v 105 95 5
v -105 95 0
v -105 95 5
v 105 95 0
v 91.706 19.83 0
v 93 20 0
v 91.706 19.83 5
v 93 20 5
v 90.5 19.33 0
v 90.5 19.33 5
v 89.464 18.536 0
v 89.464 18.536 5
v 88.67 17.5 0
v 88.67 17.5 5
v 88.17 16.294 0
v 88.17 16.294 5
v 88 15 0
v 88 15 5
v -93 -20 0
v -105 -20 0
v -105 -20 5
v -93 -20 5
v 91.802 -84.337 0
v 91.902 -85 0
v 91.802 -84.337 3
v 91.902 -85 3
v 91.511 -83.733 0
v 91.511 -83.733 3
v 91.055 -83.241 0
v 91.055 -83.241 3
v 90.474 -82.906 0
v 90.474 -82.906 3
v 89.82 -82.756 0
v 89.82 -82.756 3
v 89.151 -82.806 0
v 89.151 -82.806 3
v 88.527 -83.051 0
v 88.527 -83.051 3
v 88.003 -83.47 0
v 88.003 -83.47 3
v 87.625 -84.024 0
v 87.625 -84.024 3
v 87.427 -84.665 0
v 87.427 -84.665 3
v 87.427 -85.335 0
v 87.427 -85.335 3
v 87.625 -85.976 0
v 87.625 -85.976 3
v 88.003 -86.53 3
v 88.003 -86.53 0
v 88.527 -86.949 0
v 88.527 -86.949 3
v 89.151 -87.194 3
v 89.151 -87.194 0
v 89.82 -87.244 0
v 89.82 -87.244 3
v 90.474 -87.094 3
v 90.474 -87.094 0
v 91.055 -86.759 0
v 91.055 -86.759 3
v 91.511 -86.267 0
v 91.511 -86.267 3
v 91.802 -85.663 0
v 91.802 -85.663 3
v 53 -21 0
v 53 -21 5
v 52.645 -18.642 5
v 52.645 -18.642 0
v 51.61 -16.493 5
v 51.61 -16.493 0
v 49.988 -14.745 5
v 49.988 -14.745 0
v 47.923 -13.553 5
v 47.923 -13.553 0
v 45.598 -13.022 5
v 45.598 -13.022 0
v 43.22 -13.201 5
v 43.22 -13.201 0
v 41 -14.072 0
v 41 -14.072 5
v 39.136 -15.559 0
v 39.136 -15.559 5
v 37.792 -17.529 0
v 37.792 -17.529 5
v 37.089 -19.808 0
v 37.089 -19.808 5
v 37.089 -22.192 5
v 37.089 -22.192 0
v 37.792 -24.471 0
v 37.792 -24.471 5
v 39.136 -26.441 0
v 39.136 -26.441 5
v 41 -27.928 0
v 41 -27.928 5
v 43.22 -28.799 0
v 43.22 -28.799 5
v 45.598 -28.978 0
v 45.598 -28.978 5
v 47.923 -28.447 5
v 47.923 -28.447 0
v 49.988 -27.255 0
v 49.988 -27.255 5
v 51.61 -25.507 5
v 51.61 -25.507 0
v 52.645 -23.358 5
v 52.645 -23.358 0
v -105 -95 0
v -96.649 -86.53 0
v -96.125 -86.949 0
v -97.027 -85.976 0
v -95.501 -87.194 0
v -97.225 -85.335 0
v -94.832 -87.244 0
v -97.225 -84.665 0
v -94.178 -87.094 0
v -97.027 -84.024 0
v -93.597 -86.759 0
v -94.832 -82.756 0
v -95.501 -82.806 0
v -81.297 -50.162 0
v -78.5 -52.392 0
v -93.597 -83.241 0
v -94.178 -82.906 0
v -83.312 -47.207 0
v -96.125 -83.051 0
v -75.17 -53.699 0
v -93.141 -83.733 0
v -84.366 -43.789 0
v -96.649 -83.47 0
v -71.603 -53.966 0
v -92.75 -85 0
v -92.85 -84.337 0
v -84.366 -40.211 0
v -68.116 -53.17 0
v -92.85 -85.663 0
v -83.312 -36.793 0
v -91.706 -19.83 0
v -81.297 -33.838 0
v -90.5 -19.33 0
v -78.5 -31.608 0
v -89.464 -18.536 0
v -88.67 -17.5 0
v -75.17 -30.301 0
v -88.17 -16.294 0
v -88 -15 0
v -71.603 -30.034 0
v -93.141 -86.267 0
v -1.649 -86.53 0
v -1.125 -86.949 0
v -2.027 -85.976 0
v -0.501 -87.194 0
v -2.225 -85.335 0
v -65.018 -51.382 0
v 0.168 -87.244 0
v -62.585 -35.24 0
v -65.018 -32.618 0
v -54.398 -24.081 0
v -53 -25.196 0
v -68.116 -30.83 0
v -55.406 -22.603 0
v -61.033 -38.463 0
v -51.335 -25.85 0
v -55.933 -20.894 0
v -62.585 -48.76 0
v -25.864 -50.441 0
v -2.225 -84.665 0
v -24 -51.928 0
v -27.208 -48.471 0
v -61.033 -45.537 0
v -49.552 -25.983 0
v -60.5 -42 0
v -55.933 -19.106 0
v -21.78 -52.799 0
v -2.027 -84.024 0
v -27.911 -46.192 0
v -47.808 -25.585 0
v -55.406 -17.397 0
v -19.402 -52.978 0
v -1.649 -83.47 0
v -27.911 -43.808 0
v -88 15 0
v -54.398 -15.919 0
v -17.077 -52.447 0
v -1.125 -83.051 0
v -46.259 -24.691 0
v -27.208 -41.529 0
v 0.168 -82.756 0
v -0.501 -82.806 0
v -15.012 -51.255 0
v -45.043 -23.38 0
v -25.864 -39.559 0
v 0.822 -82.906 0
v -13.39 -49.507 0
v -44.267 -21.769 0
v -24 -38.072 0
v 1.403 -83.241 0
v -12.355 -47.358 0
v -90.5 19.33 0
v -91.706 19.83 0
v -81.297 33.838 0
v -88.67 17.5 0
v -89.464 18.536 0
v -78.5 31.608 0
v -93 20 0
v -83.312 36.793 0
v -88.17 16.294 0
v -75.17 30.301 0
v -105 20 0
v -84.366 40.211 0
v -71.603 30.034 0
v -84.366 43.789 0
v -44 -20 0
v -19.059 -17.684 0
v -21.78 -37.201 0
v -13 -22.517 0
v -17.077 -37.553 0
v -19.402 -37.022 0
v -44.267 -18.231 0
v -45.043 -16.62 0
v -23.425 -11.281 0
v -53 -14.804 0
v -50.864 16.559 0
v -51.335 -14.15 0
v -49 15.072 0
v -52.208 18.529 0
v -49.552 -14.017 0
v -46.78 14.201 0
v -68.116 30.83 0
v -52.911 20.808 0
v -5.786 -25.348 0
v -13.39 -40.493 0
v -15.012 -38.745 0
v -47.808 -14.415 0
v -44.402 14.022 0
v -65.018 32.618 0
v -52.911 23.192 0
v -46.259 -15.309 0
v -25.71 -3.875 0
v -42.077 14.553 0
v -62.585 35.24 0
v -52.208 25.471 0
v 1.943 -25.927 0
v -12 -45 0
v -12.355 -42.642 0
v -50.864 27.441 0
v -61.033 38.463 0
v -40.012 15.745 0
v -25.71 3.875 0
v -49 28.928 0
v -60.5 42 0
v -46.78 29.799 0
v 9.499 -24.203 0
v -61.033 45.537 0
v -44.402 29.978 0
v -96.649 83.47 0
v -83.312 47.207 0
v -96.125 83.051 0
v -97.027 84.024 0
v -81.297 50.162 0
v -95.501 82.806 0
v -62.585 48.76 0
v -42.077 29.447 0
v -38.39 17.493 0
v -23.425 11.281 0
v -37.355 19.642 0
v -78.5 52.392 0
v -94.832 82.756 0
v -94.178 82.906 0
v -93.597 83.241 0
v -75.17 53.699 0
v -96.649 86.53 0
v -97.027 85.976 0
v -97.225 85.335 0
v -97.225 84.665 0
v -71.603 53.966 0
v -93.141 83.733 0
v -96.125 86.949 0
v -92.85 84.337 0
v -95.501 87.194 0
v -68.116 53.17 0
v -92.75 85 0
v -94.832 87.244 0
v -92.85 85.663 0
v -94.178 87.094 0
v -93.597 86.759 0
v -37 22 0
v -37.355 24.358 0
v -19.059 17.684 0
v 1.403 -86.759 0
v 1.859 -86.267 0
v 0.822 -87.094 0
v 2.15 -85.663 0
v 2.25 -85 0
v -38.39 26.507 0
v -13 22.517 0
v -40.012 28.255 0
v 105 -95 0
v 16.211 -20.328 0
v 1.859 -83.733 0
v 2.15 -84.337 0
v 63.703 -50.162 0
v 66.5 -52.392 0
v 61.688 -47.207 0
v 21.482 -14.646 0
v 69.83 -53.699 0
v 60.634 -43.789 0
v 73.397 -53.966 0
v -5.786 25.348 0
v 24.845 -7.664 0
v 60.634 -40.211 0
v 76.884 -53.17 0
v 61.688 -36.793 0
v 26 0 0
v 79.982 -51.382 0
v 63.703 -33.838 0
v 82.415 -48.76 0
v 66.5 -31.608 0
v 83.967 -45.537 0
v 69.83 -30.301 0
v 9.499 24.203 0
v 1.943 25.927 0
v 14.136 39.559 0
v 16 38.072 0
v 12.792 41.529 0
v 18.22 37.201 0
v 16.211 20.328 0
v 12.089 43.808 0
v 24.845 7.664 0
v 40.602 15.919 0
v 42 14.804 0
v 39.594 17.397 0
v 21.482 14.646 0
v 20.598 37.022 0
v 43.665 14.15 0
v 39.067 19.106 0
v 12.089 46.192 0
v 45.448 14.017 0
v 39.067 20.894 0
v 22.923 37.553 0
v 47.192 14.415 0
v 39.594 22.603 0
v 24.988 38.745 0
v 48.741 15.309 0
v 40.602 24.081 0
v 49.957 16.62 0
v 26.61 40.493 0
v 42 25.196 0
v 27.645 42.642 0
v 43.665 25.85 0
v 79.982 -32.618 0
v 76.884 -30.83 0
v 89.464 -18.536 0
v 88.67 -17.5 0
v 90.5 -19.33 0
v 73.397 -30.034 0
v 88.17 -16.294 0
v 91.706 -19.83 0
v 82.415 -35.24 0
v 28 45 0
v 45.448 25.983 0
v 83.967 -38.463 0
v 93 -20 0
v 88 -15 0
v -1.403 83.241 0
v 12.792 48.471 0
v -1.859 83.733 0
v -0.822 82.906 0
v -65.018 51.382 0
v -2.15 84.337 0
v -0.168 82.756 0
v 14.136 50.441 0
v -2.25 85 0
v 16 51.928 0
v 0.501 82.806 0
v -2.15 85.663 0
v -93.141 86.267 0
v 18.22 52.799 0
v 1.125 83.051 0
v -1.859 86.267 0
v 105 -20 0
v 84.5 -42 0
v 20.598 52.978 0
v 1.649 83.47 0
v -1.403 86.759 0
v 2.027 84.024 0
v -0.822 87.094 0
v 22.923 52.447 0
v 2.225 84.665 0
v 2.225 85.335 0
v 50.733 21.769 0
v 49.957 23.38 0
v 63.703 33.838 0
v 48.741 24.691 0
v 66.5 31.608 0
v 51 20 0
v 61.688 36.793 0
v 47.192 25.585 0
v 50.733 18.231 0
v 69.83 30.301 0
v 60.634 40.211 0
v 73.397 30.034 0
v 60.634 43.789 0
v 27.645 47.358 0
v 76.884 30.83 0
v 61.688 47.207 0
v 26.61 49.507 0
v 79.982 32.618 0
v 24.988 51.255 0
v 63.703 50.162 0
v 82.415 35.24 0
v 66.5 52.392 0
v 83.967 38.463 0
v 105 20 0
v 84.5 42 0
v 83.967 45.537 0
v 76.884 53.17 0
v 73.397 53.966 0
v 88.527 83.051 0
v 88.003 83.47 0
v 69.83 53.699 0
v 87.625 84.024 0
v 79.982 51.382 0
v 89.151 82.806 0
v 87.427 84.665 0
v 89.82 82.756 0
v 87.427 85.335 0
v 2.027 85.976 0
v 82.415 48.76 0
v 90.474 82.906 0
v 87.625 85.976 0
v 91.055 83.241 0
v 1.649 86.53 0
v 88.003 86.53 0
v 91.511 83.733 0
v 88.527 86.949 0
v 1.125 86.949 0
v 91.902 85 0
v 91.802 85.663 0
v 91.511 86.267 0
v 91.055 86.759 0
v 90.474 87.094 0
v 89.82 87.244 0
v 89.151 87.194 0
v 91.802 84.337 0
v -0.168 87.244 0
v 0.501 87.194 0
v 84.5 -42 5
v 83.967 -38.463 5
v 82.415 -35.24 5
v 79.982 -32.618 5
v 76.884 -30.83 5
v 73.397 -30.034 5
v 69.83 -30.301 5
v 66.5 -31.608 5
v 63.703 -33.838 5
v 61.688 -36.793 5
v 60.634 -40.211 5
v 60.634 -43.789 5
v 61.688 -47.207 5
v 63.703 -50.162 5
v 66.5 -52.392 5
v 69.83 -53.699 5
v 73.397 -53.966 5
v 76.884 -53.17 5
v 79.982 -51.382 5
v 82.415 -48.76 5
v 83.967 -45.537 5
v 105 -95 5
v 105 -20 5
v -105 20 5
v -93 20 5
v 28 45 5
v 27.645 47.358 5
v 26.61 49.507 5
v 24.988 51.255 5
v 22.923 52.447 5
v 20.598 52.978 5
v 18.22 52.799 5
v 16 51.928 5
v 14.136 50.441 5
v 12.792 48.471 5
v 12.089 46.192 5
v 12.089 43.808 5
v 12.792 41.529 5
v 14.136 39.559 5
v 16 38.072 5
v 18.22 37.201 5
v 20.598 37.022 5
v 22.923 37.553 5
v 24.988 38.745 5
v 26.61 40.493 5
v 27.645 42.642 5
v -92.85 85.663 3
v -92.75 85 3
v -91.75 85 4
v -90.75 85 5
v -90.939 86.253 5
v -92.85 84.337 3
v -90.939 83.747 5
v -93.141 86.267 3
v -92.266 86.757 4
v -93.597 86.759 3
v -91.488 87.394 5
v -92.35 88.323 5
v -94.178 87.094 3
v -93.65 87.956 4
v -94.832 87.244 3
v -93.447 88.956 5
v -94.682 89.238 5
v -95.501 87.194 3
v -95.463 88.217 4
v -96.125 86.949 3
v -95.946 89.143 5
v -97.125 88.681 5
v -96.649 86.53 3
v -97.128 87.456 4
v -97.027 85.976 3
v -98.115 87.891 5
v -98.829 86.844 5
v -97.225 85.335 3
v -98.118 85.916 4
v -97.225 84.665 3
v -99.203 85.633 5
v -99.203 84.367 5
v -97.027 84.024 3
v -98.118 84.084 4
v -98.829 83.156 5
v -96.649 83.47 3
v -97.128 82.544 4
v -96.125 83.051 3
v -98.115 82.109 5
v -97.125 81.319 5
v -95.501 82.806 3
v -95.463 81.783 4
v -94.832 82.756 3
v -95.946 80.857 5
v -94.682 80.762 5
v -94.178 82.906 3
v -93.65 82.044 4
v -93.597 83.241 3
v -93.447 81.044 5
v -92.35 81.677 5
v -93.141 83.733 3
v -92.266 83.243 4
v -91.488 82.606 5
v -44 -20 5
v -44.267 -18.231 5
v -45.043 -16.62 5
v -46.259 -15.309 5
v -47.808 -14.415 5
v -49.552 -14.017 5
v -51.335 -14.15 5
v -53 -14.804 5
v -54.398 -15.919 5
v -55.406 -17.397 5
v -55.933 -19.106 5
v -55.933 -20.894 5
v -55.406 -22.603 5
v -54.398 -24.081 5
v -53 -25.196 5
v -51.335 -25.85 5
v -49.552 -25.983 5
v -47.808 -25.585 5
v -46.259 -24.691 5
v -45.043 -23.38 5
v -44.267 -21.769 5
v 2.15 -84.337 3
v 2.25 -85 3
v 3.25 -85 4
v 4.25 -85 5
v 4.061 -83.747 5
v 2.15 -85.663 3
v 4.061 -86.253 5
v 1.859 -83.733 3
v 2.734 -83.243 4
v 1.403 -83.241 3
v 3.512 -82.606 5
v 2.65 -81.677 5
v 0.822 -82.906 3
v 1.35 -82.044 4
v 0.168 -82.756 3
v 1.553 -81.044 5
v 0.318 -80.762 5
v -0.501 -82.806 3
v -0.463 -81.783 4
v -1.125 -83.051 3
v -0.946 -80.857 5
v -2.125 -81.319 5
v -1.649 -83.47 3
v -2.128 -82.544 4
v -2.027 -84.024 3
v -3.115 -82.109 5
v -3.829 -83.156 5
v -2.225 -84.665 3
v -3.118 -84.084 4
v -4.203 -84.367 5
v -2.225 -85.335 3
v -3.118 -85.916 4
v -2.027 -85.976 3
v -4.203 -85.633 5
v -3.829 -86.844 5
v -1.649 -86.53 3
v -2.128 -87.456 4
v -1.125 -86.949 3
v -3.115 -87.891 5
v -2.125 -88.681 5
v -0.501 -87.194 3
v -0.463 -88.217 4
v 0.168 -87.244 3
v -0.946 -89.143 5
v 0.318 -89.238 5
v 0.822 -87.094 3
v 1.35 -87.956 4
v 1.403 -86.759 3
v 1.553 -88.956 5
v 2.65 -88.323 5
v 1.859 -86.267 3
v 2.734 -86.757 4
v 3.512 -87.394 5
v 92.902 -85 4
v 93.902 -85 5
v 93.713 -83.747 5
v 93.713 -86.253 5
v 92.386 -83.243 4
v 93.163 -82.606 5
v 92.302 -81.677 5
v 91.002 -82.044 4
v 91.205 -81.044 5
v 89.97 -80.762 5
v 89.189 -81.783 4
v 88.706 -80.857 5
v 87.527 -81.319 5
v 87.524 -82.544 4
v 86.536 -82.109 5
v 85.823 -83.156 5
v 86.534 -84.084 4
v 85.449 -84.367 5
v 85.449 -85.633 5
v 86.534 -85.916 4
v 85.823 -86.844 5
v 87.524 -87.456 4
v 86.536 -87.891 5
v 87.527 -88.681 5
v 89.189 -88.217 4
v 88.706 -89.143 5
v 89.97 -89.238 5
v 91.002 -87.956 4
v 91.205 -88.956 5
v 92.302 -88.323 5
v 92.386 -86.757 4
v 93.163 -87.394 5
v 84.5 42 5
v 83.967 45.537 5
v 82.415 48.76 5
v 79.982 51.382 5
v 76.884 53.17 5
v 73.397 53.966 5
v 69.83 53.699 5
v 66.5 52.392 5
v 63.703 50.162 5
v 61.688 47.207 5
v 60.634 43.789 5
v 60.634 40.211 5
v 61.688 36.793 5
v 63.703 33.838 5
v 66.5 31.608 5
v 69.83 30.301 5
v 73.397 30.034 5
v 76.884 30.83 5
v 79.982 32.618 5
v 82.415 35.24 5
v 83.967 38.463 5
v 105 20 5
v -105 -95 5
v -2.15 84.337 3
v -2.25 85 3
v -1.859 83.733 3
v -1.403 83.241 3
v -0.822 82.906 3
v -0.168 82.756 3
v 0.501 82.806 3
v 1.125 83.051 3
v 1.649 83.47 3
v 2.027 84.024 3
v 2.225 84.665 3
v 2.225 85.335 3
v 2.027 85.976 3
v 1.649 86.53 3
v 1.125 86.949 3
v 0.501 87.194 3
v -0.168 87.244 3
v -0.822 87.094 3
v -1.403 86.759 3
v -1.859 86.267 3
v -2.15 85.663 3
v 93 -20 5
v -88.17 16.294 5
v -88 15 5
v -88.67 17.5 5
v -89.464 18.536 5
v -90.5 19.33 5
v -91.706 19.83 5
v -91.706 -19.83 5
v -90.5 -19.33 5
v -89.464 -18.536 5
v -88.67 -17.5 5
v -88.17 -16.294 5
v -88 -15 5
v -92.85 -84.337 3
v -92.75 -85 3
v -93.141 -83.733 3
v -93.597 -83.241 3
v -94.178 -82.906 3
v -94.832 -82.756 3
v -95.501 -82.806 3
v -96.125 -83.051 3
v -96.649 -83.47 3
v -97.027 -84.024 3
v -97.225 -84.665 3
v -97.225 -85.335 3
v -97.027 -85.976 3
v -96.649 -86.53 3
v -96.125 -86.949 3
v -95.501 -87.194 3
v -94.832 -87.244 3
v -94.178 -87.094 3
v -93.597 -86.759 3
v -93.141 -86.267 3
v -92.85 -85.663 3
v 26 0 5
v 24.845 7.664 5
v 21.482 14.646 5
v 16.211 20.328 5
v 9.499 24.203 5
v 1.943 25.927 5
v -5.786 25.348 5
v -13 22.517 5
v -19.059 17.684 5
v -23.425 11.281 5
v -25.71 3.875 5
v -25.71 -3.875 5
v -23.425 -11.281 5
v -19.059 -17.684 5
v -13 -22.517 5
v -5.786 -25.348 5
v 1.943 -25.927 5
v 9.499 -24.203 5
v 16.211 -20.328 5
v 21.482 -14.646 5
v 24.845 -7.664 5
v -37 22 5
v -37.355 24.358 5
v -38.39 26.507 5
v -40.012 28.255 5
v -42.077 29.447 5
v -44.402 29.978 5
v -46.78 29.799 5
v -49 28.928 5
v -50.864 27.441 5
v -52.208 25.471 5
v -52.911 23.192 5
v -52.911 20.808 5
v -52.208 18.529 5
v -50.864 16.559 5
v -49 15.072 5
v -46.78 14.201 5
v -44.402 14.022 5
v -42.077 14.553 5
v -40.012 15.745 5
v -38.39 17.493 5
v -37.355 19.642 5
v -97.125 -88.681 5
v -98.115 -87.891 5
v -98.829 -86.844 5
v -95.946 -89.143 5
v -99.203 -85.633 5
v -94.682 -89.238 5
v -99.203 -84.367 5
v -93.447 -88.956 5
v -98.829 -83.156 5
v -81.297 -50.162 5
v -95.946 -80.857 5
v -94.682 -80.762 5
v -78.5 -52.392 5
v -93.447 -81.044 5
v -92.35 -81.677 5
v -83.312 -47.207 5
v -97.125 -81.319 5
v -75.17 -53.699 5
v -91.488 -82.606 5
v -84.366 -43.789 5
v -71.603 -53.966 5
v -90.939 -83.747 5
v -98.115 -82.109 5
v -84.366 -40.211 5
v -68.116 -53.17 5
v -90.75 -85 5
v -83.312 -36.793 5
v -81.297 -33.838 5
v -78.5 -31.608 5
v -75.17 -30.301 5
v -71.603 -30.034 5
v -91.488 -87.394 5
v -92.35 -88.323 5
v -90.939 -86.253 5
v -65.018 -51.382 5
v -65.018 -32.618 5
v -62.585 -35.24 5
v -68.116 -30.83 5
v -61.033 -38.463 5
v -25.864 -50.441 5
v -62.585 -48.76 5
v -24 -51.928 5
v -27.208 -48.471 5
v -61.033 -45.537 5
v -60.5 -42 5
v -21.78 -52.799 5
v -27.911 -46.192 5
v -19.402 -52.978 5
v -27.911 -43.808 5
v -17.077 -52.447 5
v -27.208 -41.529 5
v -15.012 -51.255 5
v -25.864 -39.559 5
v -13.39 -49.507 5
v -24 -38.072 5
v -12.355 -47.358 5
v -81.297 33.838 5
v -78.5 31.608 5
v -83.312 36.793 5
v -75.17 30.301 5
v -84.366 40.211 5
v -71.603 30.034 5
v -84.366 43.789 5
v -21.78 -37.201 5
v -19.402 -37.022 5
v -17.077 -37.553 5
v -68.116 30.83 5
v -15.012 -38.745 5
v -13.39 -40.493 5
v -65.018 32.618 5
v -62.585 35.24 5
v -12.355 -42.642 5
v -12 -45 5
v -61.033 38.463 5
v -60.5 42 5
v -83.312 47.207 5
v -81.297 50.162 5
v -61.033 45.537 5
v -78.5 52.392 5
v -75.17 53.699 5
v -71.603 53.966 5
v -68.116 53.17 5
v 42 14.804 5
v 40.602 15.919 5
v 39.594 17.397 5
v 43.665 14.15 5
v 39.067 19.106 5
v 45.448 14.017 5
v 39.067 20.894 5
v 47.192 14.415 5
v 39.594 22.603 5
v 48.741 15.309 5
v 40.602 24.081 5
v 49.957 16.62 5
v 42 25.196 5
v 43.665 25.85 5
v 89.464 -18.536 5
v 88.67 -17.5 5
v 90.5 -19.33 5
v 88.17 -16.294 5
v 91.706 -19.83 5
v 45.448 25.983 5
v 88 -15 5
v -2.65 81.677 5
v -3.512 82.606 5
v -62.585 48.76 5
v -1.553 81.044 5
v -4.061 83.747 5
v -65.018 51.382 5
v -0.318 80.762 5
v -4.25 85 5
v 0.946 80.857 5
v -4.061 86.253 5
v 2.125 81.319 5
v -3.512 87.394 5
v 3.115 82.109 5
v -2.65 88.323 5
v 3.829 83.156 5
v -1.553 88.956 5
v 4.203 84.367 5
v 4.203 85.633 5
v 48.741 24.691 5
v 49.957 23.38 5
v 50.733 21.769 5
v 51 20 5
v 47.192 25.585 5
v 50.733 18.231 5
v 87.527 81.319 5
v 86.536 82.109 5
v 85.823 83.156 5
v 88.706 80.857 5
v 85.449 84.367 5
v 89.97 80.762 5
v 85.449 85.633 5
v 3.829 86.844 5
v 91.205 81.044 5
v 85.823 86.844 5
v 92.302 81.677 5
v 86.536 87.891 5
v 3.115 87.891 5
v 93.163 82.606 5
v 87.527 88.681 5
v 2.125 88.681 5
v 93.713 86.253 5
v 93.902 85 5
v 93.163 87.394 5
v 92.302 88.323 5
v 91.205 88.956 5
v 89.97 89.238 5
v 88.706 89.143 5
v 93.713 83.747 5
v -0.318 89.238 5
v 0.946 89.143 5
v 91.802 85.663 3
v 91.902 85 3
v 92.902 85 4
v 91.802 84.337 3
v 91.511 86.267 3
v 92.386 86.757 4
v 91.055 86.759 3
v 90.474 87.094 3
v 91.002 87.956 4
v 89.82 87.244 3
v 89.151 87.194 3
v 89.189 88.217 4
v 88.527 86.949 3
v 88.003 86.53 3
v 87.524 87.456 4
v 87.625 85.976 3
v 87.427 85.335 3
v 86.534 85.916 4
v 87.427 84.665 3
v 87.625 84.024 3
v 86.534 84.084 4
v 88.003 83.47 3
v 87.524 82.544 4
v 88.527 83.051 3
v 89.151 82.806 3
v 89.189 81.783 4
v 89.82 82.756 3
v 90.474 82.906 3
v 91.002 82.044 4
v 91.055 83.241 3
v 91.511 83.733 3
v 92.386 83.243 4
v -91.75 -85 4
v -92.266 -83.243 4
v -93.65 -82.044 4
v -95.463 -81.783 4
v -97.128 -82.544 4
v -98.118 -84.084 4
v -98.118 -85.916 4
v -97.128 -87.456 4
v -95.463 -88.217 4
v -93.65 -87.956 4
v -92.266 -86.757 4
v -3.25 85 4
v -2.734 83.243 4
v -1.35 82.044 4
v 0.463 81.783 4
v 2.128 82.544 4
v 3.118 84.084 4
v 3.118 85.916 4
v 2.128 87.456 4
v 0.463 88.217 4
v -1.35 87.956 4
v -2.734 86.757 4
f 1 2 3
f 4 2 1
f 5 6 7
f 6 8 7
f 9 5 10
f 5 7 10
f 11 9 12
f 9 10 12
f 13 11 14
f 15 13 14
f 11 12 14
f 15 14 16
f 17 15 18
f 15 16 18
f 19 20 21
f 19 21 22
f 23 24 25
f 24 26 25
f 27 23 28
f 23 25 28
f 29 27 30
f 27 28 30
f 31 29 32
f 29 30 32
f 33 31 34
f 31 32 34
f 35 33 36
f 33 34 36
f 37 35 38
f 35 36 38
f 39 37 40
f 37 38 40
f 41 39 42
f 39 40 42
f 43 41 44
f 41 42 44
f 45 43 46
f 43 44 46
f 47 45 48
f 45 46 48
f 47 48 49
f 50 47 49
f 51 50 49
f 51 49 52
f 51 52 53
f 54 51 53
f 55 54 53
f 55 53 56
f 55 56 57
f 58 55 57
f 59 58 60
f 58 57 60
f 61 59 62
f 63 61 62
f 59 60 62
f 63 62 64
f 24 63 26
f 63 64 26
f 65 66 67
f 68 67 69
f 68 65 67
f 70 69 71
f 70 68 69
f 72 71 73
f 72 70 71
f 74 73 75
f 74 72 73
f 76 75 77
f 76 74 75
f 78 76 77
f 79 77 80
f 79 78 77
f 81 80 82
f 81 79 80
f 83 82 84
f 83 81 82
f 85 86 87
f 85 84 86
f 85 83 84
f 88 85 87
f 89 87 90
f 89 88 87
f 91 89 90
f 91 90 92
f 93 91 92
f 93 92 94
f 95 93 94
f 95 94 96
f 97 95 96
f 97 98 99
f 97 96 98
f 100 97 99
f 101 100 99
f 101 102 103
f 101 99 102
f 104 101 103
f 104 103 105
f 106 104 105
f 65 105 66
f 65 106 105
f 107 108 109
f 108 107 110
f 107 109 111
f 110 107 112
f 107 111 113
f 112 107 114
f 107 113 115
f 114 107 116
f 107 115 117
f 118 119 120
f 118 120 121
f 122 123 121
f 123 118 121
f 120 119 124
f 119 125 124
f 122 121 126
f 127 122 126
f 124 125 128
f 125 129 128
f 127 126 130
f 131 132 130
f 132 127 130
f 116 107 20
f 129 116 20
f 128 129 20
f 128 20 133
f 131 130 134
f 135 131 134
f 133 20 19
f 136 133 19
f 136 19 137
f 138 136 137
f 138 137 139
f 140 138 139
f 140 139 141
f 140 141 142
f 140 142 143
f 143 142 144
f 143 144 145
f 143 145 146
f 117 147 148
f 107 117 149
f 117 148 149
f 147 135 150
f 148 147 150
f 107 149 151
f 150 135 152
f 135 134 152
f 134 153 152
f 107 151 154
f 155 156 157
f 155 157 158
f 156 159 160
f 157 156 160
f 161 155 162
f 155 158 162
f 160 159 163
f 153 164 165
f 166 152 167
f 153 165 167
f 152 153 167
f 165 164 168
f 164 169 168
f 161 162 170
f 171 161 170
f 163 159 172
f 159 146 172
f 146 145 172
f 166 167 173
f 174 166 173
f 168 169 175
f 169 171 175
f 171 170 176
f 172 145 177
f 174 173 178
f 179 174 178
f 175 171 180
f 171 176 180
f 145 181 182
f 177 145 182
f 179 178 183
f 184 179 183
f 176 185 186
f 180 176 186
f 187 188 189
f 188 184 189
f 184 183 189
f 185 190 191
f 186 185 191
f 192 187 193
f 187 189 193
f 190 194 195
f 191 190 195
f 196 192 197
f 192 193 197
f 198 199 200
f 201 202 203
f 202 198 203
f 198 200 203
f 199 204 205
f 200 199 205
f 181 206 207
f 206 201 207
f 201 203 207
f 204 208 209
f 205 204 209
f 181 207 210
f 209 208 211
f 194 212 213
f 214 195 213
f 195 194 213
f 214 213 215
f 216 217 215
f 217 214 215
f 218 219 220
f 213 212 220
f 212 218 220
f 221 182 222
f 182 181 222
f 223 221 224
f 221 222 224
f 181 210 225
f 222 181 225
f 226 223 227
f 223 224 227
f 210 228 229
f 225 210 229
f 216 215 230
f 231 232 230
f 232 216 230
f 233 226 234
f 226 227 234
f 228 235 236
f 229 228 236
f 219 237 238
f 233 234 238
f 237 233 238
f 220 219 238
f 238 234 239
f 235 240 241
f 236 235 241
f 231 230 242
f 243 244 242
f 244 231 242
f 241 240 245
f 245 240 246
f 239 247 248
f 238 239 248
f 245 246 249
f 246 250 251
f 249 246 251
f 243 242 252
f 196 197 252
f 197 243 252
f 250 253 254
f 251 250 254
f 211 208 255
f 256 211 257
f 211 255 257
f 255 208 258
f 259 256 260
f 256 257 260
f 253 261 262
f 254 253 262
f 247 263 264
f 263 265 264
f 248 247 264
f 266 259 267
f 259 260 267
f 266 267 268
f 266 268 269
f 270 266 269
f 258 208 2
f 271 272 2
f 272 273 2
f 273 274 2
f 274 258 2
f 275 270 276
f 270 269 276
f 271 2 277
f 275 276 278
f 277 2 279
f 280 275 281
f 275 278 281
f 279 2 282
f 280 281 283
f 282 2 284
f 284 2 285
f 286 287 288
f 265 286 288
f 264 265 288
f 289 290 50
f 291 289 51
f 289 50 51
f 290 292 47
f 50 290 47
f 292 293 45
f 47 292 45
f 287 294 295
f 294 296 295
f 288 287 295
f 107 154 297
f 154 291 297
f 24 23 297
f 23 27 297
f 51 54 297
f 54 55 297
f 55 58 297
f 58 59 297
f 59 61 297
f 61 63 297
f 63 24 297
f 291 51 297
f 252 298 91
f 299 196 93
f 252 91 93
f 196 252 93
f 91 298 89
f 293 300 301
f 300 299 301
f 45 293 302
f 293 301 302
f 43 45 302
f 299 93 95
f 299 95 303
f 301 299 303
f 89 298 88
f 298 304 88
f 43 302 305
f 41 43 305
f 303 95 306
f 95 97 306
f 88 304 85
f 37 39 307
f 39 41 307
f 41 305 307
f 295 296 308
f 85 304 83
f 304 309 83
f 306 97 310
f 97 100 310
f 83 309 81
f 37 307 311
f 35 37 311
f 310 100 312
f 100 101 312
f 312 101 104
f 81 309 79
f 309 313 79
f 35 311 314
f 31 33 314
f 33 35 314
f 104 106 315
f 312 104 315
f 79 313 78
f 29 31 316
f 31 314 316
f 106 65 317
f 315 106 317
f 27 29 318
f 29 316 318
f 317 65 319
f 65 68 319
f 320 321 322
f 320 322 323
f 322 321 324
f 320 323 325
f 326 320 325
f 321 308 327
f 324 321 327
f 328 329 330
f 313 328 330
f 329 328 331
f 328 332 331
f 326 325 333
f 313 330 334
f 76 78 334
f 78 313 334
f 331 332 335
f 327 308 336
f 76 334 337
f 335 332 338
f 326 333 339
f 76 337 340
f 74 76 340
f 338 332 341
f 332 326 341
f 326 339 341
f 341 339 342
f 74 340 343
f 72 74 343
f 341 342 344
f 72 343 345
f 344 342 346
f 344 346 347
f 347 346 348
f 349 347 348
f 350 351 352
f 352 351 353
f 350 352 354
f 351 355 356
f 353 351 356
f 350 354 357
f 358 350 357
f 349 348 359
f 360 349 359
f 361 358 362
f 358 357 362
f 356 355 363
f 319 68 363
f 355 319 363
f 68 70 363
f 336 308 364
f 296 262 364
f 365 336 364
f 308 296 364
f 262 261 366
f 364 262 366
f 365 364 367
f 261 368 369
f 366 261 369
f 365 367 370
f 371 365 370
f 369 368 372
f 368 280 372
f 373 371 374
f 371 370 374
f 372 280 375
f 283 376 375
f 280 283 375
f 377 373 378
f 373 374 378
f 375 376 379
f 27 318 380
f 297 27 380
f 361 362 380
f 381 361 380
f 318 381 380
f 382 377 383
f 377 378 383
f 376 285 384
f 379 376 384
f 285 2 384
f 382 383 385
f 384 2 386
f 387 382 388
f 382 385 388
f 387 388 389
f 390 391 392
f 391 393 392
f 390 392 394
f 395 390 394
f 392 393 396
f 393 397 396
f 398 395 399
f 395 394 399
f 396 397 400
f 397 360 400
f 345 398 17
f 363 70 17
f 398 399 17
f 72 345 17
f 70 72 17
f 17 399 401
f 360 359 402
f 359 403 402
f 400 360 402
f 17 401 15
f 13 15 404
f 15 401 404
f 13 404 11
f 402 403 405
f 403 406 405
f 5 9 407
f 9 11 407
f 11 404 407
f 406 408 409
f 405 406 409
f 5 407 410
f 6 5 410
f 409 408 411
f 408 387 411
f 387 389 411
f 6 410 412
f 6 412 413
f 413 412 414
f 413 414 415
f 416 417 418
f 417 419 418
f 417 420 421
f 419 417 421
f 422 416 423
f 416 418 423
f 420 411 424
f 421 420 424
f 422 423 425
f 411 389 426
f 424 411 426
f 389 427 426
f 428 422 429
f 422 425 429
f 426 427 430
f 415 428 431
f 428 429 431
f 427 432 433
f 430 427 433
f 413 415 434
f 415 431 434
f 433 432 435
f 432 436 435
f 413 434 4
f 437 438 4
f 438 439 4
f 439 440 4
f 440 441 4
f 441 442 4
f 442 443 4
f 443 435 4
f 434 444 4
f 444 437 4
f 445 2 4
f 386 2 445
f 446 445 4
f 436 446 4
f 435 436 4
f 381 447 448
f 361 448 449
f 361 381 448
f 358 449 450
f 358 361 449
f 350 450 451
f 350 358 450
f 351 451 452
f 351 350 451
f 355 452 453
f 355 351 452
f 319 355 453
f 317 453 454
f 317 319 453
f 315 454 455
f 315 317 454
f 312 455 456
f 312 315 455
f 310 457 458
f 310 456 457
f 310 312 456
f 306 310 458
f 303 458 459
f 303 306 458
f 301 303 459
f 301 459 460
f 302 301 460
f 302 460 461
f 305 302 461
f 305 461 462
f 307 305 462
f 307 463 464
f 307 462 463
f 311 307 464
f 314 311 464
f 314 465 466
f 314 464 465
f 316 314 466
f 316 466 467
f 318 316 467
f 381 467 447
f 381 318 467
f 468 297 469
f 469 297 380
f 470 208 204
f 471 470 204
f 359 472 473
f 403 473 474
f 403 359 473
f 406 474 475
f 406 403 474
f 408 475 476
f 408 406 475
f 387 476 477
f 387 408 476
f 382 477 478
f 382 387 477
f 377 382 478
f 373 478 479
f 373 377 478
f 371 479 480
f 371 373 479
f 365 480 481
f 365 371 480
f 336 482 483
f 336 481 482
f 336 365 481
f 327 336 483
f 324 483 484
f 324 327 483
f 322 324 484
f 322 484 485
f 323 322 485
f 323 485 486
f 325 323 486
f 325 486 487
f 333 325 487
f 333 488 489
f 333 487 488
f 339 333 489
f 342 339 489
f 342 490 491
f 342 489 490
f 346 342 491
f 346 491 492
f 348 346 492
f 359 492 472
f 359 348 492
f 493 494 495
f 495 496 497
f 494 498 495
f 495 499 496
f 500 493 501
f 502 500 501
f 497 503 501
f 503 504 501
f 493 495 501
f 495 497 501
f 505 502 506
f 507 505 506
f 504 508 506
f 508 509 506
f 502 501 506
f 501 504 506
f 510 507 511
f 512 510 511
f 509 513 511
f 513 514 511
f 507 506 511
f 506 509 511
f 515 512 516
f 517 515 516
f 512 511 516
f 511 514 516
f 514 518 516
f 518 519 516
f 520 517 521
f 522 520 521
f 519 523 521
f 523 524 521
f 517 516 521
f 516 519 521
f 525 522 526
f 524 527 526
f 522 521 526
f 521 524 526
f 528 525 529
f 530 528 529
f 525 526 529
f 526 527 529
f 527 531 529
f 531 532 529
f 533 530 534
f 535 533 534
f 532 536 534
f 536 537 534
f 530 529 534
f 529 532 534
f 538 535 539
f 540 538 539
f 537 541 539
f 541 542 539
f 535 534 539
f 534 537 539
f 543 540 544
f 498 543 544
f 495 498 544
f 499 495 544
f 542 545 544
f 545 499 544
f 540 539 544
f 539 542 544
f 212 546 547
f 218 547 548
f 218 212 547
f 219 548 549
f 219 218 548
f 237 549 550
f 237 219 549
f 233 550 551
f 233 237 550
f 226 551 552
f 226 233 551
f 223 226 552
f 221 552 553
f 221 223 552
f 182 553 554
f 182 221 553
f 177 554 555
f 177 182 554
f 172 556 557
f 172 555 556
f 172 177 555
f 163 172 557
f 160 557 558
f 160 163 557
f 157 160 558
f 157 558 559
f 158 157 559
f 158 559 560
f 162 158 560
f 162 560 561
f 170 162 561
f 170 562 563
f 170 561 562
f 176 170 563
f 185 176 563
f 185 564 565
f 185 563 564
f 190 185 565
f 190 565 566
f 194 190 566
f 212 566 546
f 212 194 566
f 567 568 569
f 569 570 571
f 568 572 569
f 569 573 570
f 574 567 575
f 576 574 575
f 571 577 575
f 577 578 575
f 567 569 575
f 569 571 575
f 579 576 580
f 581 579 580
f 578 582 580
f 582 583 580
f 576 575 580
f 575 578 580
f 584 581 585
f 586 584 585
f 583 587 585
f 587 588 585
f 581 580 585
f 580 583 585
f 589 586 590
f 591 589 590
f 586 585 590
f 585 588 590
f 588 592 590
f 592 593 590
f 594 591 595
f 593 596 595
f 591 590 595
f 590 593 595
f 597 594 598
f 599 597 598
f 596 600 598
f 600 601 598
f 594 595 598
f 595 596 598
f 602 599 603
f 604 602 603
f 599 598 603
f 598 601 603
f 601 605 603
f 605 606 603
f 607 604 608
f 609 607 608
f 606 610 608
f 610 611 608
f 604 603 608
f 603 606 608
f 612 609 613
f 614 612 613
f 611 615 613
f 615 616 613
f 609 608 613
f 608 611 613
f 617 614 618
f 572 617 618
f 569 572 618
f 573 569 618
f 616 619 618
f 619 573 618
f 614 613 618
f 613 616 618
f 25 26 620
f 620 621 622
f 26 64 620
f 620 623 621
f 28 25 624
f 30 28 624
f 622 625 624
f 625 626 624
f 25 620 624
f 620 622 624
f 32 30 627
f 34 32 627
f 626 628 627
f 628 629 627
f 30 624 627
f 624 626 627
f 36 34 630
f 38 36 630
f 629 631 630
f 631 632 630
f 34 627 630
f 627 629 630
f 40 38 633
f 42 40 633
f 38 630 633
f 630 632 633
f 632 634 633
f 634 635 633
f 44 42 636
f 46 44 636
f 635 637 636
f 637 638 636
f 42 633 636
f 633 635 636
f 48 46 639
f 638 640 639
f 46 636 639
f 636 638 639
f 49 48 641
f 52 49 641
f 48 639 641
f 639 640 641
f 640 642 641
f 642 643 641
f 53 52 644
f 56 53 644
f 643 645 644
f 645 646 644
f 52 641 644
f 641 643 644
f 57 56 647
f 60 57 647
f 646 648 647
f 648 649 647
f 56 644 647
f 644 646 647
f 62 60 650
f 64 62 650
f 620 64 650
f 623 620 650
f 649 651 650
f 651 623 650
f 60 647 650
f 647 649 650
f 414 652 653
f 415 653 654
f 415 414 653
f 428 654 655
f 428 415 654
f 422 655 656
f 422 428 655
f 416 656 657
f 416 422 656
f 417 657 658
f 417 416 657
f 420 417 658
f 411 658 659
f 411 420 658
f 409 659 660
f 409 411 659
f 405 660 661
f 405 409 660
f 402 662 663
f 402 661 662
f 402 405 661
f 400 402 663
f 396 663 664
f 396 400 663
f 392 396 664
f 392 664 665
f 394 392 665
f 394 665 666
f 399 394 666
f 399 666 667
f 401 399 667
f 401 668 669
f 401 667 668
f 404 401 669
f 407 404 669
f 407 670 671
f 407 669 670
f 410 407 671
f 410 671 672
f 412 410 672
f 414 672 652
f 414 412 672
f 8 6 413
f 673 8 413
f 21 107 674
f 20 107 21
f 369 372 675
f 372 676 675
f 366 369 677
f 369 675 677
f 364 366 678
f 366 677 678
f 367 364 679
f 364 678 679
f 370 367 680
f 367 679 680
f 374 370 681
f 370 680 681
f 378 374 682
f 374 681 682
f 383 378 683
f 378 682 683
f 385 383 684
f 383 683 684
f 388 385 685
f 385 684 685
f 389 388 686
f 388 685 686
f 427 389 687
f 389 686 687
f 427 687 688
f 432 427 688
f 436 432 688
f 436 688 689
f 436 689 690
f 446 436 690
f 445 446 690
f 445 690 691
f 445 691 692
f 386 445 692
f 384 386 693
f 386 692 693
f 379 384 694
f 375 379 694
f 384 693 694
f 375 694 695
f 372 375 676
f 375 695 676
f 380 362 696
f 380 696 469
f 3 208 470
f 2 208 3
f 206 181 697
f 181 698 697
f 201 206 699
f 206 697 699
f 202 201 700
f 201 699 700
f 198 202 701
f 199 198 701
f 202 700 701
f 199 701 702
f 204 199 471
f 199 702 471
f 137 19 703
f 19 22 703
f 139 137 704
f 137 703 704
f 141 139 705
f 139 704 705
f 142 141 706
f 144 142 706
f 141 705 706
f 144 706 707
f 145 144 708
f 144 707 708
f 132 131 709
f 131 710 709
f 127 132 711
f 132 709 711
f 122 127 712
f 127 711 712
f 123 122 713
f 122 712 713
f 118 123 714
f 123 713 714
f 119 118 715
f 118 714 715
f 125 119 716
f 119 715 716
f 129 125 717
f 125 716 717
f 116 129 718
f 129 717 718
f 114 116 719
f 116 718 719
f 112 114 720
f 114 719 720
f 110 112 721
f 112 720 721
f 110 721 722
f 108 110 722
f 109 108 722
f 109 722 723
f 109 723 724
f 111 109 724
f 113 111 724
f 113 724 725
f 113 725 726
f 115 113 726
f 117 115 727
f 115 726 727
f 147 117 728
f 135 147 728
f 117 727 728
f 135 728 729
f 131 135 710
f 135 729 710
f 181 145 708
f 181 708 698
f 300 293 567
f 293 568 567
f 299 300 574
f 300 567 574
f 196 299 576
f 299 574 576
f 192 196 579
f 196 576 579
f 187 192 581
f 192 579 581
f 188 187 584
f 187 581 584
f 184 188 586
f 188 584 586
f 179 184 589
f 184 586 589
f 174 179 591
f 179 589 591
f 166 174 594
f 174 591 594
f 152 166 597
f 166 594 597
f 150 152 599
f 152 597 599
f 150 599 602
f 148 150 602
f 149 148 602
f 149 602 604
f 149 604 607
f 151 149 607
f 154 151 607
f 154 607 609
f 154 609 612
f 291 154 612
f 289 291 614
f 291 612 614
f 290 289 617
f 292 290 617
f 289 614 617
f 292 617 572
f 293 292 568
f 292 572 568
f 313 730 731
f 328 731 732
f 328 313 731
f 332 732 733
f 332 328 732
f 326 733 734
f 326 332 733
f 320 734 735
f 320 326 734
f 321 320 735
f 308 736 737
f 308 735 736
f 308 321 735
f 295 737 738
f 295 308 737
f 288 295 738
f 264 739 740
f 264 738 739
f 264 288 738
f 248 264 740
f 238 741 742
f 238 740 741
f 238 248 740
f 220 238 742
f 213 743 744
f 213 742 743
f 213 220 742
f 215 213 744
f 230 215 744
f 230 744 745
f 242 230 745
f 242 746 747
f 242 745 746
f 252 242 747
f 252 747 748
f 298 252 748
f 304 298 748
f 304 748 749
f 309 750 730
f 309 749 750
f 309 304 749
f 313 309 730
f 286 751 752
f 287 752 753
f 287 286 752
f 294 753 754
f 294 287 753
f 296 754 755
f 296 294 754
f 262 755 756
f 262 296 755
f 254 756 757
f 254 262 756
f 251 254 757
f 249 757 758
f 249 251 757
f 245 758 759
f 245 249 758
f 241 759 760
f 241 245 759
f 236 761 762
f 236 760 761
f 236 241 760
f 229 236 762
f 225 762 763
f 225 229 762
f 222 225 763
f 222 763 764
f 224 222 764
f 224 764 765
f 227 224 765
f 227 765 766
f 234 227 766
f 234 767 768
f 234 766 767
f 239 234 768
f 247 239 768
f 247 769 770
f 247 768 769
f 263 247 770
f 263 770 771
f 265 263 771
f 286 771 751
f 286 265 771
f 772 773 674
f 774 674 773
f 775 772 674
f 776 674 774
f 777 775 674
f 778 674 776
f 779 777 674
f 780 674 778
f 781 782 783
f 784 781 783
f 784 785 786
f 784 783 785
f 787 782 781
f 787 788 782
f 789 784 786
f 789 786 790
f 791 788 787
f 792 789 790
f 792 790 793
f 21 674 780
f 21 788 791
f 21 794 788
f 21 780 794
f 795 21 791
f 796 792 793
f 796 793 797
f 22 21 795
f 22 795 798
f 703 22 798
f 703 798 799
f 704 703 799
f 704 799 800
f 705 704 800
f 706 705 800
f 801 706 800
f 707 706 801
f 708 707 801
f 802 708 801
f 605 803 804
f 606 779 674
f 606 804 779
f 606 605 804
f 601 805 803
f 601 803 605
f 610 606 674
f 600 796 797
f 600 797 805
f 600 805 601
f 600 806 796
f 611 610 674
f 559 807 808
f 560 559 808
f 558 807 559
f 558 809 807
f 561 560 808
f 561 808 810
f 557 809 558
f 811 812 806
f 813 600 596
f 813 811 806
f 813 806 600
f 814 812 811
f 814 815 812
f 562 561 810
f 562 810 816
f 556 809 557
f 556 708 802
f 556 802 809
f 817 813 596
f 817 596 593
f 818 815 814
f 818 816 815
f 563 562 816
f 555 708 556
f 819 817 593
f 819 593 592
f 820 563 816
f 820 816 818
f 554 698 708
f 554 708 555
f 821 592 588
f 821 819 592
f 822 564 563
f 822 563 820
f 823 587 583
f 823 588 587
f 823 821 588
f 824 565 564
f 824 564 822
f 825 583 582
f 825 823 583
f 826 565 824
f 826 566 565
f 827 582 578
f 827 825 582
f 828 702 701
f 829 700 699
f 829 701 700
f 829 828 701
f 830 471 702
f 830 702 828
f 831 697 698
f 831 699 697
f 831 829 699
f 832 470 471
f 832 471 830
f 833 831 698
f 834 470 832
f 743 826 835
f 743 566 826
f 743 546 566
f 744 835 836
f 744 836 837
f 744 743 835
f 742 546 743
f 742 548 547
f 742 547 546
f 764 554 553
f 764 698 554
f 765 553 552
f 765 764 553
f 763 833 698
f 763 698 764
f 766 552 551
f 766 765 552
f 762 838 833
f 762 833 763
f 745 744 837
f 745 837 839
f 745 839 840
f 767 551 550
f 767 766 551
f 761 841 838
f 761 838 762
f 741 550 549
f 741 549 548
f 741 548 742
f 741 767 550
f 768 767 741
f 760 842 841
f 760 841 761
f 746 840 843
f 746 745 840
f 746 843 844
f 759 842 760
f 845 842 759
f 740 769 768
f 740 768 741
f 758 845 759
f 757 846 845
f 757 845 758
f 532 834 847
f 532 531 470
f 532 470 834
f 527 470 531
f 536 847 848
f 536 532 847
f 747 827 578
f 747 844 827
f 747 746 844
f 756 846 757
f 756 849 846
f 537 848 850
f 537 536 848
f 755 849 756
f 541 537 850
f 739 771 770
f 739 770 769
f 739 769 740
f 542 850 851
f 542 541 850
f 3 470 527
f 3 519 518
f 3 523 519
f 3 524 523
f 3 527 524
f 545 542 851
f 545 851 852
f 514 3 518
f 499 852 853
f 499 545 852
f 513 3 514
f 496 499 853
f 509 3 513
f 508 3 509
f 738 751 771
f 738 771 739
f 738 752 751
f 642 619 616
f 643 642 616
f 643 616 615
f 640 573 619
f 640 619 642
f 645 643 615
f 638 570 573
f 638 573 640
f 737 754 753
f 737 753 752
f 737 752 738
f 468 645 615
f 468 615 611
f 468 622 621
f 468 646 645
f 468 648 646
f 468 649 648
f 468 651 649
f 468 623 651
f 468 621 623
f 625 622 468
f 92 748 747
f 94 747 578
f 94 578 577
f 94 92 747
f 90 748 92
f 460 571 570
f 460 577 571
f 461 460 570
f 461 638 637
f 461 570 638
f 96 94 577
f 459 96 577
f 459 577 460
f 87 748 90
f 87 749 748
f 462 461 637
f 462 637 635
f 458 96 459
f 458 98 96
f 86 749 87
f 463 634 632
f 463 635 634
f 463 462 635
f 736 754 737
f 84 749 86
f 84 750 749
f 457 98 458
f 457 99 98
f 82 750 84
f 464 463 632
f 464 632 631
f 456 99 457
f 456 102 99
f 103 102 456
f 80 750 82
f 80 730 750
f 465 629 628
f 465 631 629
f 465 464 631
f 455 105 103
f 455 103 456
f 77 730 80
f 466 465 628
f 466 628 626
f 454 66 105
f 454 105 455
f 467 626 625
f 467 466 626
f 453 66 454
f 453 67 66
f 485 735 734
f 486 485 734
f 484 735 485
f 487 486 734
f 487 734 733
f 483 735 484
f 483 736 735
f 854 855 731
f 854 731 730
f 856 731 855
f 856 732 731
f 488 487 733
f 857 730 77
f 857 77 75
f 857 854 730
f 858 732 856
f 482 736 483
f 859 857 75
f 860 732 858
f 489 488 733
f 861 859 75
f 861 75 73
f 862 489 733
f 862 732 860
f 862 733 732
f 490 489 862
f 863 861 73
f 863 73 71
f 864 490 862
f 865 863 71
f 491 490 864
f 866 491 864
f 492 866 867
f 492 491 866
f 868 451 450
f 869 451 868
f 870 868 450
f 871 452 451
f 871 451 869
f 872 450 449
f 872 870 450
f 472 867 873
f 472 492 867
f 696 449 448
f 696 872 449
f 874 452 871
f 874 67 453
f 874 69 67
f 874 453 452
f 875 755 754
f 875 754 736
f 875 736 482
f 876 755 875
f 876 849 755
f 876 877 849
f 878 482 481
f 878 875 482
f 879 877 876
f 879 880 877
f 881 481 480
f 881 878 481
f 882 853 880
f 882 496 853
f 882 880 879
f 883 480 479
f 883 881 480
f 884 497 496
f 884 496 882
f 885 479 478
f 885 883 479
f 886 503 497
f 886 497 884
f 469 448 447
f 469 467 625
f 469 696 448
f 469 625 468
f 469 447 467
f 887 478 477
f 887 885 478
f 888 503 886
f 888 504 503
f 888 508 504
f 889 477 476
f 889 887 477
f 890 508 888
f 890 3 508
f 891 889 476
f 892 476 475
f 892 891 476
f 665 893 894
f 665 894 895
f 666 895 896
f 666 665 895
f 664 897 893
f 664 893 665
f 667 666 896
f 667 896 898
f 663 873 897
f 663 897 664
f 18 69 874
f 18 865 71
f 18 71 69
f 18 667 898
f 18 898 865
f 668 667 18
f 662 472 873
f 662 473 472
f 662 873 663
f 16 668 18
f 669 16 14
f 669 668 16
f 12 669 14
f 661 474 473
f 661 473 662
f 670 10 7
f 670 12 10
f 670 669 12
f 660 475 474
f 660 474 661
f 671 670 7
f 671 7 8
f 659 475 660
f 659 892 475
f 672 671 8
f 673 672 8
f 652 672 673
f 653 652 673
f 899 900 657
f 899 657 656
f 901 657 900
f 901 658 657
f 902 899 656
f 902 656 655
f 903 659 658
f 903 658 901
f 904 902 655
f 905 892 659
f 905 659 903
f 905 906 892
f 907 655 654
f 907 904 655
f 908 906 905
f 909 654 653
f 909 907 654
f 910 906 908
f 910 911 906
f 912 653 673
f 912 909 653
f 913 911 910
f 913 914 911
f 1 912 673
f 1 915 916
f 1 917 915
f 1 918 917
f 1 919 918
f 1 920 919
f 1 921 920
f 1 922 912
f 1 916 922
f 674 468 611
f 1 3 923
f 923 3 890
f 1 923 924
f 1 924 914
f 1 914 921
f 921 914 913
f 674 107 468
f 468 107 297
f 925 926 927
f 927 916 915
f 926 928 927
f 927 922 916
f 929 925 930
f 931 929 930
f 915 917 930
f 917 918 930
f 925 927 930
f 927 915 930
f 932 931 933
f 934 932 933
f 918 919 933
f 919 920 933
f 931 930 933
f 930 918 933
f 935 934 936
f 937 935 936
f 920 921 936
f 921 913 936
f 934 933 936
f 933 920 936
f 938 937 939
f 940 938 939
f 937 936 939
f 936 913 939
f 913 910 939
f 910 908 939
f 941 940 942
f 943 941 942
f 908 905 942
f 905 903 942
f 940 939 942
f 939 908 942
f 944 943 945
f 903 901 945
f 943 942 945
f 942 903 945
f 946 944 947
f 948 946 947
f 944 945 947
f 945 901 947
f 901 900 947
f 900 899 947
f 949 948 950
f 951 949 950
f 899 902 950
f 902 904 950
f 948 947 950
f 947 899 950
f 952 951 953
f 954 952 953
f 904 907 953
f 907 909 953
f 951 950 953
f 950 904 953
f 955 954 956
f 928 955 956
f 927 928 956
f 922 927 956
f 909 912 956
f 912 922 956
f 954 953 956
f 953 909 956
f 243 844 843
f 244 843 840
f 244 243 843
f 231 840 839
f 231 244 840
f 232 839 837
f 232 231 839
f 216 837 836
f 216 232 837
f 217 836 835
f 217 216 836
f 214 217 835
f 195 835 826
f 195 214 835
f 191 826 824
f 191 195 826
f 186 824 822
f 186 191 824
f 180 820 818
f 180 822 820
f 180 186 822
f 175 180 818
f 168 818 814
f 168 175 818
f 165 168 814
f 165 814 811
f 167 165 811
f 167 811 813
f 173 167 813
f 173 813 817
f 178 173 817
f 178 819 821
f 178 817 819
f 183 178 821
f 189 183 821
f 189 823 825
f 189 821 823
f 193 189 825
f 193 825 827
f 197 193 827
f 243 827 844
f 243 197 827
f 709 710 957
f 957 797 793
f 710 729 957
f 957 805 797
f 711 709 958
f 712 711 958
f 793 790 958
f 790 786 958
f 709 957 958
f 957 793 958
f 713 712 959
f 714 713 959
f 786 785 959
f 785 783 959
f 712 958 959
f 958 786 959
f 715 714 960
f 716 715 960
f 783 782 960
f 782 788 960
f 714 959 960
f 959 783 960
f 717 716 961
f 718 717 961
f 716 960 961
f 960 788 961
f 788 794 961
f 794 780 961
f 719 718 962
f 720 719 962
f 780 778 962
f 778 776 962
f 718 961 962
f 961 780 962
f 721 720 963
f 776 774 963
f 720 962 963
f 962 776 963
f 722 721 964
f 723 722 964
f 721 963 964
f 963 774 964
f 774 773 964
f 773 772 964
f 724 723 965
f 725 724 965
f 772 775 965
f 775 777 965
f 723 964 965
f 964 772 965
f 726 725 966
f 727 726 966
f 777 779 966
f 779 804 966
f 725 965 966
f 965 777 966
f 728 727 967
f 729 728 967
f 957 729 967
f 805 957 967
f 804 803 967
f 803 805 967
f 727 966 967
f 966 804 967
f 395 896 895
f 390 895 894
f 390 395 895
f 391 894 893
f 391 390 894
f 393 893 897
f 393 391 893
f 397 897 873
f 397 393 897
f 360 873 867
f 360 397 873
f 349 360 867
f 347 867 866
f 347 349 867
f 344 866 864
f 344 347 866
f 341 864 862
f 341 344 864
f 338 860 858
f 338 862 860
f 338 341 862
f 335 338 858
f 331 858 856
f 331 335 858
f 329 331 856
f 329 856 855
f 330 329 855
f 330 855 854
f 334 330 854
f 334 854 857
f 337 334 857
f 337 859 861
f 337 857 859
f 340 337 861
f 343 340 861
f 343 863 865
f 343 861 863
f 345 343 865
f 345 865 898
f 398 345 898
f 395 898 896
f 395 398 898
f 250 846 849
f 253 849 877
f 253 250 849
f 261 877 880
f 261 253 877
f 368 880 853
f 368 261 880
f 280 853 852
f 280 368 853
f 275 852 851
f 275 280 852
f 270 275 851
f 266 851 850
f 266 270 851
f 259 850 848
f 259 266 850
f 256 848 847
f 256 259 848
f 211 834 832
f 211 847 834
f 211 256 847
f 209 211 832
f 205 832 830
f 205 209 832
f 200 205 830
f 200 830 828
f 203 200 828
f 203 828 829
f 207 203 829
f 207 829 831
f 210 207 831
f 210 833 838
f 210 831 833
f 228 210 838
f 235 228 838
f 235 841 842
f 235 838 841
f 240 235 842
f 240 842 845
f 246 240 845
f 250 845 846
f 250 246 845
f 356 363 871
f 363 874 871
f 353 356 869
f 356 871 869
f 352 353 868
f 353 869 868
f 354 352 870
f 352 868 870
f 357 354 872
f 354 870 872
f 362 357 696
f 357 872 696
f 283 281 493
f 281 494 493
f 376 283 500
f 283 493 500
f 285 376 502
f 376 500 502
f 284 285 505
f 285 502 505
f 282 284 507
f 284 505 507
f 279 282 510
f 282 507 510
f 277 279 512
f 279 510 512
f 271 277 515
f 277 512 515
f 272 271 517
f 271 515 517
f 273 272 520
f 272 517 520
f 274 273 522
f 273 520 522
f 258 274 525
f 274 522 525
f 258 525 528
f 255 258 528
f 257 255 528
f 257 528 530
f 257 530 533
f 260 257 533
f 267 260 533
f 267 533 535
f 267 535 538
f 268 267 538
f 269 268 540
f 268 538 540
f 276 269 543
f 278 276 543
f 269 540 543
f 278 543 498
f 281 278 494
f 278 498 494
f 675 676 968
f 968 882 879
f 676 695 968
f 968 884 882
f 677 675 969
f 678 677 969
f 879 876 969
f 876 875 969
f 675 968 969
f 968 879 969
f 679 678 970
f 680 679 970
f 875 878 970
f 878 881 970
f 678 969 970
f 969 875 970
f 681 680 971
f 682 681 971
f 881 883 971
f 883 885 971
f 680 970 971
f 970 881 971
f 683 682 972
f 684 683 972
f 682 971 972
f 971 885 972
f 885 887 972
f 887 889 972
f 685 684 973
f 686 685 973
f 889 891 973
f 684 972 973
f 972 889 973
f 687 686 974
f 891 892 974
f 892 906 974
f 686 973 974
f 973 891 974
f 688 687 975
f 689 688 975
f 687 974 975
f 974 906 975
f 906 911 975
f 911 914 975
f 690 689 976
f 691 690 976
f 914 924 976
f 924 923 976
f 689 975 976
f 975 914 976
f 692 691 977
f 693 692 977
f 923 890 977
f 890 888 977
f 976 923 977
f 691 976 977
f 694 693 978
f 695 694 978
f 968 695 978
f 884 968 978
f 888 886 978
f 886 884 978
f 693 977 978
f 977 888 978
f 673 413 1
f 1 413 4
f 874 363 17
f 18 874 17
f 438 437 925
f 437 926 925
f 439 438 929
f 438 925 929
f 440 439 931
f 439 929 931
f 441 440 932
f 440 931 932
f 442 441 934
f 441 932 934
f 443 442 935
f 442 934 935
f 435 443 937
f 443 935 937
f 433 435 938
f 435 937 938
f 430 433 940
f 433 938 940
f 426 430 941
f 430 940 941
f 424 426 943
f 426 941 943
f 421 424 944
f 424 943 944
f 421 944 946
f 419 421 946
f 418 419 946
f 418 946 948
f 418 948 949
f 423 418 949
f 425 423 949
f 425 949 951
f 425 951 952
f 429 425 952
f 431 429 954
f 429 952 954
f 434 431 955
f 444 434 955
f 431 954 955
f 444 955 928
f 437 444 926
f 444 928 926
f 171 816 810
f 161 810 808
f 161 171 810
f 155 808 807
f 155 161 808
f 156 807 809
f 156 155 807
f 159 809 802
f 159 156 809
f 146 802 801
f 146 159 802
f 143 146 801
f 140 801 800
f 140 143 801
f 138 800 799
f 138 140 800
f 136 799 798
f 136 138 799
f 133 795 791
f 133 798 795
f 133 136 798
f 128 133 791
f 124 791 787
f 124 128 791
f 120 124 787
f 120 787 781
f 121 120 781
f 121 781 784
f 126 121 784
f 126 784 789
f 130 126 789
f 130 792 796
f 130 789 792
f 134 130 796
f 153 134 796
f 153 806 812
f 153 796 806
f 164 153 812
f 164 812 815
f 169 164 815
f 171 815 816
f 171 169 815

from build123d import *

# Parameters (mm, degrees)
SKETCH_1_W          = 210
SKETCH_1_H          = 190
EXTRUDE_1_DEPTH     = 5
SKETCH_2_R          = 26
SKETCH_2_R_2        = 8
SKETCH_2_R_3        = 12
SKETCH_2_R_4        = 6
CUT_EXTRUDE_1_DEPTH = 142.686273153
SKETCH_5_W          = 20
SKETCH_5_H          = 40
CUT_EXTRUDE_2_DEPTH = 142.686273153
FILLET_1_R          = 5


# Read off the part's stored shape, not the designer's step: ｽｹｯﾁ-ﾊﾟﾀｰﾝ1
with BuildPart() as part:
    # ｽｹｯﾁ1 → ﾎﾞｽ - 押し出し1 (new body)
    with BuildSketch(Plane.XY):
        Rectangle(SKETCH_1_W, SKETCH_1_H)
    extrude(amount=EXTRUDE_1_DEPTH)

    # ｽｹｯﾁ2 → ｶｯﾄ - 押し出し1 (cut, through all)
    with BuildSketch(Plane.XY):
        Circle(SKETCH_2_R)
        with Locations((20, 45)):
            Circle(SKETCH_2_R_2)
        with Locations((-45, 22)):
            Circle(SKETCH_2_R_2)
        with Locations((-20, -45)):
            Circle(SKETCH_2_R_2)
        with Locations((45, -21)):
            Circle(SKETCH_2_R_2)
        with Locations((-72.5, 42)):
            Circle(SKETCH_2_R_3)
        with Locations((-72.5, -42)):
            Circle(SKETCH_2_R_3)
        with Locations((72.5, -42)):
            Circle(SKETCH_2_R_3)
        with Locations((72.5, 42)):
            Circle(SKETCH_2_R_3)
        with Locations((-50, -20)):
            Circle(SKETCH_2_R_4)
        with Locations((45, 20)):
            Circle(SKETCH_2_R_4)
    extrude(amount=CUT_EXTRUDE_1_DEPTH, mode=Mode.SUBTRACT)


with BuildPart() as body_2:
    # ｽｹｯﾁ3 → 回転1 (revolve)
    with BuildSketch(Plane(origin=(0, 0, 0), x_dir=(0, 0, -1), z_dir=(1, 0, 0)), mode=Mode.PRIVATE) as revolve_1_sk:
        Polygon((3, 85), (3, 87.25), (-3, 87.25), (-10, 94.25), (-10, 85), align=None)
    revolve(revolve_1_sk.sketch.rotate(Axis((0, 85, -14.033072833), (0, 0, 1)), 90), axis=Axis((0, 85, -14.033072833), (0, 0, 1)))


with BuildPart() as body_3:
    # ｽｹｯﾁ-ﾊﾟﾀｰﾝ1 outline → ｽｹｯﾁ-ﾊﾟﾀｰﾝ1 (revolve)
    with BuildSketch(Plane(origin=(89.651938965, -85, 0), x_dir=(1, 0, 0), z_dir=(0, -1, 0))):
        Polygon((0, 10), (0, -3), (2.25, -3), (2.25, 3), (9.25, 10), align=None)
    revolve(axis=Axis((89.651938965, -85, 0), (0, 0, 1)))


with BuildPart() as body_4:
    # Pattern Sketch 1 2 outline → Pattern Sketch 1 2 (revolve)
    with BuildSketch(Plane(origin=(89.651938965, 85, 0), x_dir=(1, 0, 0), z_dir=(0, -1, 0))):
        Polygon((0, 10), (0, -3), (2.25, -3), (2.25, 3), (9.25, 10), align=None)
    revolve(axis=Axis((89.651938965, 85, 0), (0, 0, 1)))


with BuildPart() as body_5:
    # Pattern Sketch 1 3 outline → Pattern Sketch 1 3 (revolve)
    with BuildSketch(Plane.XZ.offset(85)):
        Polygon((0, 10), (0, -3), (2.25, -3), (2.25, 3), (9.25, 10), align=None)
    revolve(axis=Axis((0, -85, 0), (0, 0, 1)))


with BuildPart() as body_6:
    # Pattern Sketch 1 4 outline → Pattern Sketch 1 4 (revolve)
    with BuildSketch(Plane(origin=(-95, -85, 0), x_dir=(1, 0, 0), z_dir=(0, -1, 0))):
        Polygon((0, 10), (0, -3), (2.25, -3), (2.25, 3), (9.25, 10), align=None)
    revolve(axis=Axis((-95, -85, 0), (0, 0, 1)))


with BuildPart() as body_7:
    # Pattern Sketch 1 5 outline → Pattern Sketch 1 5 (revolve)
    with BuildSketch(Plane(origin=(-95, 85, 0), x_dir=(1, 0, 0), z_dir=(0, -1, 0))):
        Polygon((0, 10), (0, -3), (2.25, -3), (2.25, 3), (9.25, 10), align=None)
    revolve(axis=Axis((-95, 85, 0), (0, 0, 1)))


with BuildPart() as part_1:
    add(part.part)

    # Combine 1: cut body 7, body 6, body 5, body 2, body 4, body 3
    add(body_7.part, mode=Mode.SUBTRACT)
    add(body_6.part, mode=Mode.SUBTRACT)
    add(body_5.part, mode=Mode.SUBTRACT)
    add(body_2.part, mode=Mode.SUBTRACT)
    add(body_4.part, mode=Mode.SUBTRACT)
    add(body_3.part, mode=Mode.SUBTRACT)

    # ｽｹｯﾁ5 → ｶｯﾄ - 押し出し2 (cut, through all)
    with BuildSketch(Plane.XY):
        with Locations((-98, 0)):
            Rectangle(SKETCH_5_W, SKETCH_5_H)
        with Locations((98, 0)):
            Rectangle(SKETCH_5_W, SKETCH_5_H)
    extrude(amount=CUT_EXTRUDE_2_DEPTH, mode=Mode.SUBTRACT)

    # ﾌｨﾚｯﾄ1
    fillet_1_edges = [part_1.edges().sort_by_distance(p)[0] for p in [
        (88, -20, 2.5),
        (88, 20, 2.5),
        (-88, 20, 2.5),
        (-88, -20, 2.5),
    ]]
    fillet(fillet_1_edges, radius=FILLET_1_R)


solid = part_1.part
